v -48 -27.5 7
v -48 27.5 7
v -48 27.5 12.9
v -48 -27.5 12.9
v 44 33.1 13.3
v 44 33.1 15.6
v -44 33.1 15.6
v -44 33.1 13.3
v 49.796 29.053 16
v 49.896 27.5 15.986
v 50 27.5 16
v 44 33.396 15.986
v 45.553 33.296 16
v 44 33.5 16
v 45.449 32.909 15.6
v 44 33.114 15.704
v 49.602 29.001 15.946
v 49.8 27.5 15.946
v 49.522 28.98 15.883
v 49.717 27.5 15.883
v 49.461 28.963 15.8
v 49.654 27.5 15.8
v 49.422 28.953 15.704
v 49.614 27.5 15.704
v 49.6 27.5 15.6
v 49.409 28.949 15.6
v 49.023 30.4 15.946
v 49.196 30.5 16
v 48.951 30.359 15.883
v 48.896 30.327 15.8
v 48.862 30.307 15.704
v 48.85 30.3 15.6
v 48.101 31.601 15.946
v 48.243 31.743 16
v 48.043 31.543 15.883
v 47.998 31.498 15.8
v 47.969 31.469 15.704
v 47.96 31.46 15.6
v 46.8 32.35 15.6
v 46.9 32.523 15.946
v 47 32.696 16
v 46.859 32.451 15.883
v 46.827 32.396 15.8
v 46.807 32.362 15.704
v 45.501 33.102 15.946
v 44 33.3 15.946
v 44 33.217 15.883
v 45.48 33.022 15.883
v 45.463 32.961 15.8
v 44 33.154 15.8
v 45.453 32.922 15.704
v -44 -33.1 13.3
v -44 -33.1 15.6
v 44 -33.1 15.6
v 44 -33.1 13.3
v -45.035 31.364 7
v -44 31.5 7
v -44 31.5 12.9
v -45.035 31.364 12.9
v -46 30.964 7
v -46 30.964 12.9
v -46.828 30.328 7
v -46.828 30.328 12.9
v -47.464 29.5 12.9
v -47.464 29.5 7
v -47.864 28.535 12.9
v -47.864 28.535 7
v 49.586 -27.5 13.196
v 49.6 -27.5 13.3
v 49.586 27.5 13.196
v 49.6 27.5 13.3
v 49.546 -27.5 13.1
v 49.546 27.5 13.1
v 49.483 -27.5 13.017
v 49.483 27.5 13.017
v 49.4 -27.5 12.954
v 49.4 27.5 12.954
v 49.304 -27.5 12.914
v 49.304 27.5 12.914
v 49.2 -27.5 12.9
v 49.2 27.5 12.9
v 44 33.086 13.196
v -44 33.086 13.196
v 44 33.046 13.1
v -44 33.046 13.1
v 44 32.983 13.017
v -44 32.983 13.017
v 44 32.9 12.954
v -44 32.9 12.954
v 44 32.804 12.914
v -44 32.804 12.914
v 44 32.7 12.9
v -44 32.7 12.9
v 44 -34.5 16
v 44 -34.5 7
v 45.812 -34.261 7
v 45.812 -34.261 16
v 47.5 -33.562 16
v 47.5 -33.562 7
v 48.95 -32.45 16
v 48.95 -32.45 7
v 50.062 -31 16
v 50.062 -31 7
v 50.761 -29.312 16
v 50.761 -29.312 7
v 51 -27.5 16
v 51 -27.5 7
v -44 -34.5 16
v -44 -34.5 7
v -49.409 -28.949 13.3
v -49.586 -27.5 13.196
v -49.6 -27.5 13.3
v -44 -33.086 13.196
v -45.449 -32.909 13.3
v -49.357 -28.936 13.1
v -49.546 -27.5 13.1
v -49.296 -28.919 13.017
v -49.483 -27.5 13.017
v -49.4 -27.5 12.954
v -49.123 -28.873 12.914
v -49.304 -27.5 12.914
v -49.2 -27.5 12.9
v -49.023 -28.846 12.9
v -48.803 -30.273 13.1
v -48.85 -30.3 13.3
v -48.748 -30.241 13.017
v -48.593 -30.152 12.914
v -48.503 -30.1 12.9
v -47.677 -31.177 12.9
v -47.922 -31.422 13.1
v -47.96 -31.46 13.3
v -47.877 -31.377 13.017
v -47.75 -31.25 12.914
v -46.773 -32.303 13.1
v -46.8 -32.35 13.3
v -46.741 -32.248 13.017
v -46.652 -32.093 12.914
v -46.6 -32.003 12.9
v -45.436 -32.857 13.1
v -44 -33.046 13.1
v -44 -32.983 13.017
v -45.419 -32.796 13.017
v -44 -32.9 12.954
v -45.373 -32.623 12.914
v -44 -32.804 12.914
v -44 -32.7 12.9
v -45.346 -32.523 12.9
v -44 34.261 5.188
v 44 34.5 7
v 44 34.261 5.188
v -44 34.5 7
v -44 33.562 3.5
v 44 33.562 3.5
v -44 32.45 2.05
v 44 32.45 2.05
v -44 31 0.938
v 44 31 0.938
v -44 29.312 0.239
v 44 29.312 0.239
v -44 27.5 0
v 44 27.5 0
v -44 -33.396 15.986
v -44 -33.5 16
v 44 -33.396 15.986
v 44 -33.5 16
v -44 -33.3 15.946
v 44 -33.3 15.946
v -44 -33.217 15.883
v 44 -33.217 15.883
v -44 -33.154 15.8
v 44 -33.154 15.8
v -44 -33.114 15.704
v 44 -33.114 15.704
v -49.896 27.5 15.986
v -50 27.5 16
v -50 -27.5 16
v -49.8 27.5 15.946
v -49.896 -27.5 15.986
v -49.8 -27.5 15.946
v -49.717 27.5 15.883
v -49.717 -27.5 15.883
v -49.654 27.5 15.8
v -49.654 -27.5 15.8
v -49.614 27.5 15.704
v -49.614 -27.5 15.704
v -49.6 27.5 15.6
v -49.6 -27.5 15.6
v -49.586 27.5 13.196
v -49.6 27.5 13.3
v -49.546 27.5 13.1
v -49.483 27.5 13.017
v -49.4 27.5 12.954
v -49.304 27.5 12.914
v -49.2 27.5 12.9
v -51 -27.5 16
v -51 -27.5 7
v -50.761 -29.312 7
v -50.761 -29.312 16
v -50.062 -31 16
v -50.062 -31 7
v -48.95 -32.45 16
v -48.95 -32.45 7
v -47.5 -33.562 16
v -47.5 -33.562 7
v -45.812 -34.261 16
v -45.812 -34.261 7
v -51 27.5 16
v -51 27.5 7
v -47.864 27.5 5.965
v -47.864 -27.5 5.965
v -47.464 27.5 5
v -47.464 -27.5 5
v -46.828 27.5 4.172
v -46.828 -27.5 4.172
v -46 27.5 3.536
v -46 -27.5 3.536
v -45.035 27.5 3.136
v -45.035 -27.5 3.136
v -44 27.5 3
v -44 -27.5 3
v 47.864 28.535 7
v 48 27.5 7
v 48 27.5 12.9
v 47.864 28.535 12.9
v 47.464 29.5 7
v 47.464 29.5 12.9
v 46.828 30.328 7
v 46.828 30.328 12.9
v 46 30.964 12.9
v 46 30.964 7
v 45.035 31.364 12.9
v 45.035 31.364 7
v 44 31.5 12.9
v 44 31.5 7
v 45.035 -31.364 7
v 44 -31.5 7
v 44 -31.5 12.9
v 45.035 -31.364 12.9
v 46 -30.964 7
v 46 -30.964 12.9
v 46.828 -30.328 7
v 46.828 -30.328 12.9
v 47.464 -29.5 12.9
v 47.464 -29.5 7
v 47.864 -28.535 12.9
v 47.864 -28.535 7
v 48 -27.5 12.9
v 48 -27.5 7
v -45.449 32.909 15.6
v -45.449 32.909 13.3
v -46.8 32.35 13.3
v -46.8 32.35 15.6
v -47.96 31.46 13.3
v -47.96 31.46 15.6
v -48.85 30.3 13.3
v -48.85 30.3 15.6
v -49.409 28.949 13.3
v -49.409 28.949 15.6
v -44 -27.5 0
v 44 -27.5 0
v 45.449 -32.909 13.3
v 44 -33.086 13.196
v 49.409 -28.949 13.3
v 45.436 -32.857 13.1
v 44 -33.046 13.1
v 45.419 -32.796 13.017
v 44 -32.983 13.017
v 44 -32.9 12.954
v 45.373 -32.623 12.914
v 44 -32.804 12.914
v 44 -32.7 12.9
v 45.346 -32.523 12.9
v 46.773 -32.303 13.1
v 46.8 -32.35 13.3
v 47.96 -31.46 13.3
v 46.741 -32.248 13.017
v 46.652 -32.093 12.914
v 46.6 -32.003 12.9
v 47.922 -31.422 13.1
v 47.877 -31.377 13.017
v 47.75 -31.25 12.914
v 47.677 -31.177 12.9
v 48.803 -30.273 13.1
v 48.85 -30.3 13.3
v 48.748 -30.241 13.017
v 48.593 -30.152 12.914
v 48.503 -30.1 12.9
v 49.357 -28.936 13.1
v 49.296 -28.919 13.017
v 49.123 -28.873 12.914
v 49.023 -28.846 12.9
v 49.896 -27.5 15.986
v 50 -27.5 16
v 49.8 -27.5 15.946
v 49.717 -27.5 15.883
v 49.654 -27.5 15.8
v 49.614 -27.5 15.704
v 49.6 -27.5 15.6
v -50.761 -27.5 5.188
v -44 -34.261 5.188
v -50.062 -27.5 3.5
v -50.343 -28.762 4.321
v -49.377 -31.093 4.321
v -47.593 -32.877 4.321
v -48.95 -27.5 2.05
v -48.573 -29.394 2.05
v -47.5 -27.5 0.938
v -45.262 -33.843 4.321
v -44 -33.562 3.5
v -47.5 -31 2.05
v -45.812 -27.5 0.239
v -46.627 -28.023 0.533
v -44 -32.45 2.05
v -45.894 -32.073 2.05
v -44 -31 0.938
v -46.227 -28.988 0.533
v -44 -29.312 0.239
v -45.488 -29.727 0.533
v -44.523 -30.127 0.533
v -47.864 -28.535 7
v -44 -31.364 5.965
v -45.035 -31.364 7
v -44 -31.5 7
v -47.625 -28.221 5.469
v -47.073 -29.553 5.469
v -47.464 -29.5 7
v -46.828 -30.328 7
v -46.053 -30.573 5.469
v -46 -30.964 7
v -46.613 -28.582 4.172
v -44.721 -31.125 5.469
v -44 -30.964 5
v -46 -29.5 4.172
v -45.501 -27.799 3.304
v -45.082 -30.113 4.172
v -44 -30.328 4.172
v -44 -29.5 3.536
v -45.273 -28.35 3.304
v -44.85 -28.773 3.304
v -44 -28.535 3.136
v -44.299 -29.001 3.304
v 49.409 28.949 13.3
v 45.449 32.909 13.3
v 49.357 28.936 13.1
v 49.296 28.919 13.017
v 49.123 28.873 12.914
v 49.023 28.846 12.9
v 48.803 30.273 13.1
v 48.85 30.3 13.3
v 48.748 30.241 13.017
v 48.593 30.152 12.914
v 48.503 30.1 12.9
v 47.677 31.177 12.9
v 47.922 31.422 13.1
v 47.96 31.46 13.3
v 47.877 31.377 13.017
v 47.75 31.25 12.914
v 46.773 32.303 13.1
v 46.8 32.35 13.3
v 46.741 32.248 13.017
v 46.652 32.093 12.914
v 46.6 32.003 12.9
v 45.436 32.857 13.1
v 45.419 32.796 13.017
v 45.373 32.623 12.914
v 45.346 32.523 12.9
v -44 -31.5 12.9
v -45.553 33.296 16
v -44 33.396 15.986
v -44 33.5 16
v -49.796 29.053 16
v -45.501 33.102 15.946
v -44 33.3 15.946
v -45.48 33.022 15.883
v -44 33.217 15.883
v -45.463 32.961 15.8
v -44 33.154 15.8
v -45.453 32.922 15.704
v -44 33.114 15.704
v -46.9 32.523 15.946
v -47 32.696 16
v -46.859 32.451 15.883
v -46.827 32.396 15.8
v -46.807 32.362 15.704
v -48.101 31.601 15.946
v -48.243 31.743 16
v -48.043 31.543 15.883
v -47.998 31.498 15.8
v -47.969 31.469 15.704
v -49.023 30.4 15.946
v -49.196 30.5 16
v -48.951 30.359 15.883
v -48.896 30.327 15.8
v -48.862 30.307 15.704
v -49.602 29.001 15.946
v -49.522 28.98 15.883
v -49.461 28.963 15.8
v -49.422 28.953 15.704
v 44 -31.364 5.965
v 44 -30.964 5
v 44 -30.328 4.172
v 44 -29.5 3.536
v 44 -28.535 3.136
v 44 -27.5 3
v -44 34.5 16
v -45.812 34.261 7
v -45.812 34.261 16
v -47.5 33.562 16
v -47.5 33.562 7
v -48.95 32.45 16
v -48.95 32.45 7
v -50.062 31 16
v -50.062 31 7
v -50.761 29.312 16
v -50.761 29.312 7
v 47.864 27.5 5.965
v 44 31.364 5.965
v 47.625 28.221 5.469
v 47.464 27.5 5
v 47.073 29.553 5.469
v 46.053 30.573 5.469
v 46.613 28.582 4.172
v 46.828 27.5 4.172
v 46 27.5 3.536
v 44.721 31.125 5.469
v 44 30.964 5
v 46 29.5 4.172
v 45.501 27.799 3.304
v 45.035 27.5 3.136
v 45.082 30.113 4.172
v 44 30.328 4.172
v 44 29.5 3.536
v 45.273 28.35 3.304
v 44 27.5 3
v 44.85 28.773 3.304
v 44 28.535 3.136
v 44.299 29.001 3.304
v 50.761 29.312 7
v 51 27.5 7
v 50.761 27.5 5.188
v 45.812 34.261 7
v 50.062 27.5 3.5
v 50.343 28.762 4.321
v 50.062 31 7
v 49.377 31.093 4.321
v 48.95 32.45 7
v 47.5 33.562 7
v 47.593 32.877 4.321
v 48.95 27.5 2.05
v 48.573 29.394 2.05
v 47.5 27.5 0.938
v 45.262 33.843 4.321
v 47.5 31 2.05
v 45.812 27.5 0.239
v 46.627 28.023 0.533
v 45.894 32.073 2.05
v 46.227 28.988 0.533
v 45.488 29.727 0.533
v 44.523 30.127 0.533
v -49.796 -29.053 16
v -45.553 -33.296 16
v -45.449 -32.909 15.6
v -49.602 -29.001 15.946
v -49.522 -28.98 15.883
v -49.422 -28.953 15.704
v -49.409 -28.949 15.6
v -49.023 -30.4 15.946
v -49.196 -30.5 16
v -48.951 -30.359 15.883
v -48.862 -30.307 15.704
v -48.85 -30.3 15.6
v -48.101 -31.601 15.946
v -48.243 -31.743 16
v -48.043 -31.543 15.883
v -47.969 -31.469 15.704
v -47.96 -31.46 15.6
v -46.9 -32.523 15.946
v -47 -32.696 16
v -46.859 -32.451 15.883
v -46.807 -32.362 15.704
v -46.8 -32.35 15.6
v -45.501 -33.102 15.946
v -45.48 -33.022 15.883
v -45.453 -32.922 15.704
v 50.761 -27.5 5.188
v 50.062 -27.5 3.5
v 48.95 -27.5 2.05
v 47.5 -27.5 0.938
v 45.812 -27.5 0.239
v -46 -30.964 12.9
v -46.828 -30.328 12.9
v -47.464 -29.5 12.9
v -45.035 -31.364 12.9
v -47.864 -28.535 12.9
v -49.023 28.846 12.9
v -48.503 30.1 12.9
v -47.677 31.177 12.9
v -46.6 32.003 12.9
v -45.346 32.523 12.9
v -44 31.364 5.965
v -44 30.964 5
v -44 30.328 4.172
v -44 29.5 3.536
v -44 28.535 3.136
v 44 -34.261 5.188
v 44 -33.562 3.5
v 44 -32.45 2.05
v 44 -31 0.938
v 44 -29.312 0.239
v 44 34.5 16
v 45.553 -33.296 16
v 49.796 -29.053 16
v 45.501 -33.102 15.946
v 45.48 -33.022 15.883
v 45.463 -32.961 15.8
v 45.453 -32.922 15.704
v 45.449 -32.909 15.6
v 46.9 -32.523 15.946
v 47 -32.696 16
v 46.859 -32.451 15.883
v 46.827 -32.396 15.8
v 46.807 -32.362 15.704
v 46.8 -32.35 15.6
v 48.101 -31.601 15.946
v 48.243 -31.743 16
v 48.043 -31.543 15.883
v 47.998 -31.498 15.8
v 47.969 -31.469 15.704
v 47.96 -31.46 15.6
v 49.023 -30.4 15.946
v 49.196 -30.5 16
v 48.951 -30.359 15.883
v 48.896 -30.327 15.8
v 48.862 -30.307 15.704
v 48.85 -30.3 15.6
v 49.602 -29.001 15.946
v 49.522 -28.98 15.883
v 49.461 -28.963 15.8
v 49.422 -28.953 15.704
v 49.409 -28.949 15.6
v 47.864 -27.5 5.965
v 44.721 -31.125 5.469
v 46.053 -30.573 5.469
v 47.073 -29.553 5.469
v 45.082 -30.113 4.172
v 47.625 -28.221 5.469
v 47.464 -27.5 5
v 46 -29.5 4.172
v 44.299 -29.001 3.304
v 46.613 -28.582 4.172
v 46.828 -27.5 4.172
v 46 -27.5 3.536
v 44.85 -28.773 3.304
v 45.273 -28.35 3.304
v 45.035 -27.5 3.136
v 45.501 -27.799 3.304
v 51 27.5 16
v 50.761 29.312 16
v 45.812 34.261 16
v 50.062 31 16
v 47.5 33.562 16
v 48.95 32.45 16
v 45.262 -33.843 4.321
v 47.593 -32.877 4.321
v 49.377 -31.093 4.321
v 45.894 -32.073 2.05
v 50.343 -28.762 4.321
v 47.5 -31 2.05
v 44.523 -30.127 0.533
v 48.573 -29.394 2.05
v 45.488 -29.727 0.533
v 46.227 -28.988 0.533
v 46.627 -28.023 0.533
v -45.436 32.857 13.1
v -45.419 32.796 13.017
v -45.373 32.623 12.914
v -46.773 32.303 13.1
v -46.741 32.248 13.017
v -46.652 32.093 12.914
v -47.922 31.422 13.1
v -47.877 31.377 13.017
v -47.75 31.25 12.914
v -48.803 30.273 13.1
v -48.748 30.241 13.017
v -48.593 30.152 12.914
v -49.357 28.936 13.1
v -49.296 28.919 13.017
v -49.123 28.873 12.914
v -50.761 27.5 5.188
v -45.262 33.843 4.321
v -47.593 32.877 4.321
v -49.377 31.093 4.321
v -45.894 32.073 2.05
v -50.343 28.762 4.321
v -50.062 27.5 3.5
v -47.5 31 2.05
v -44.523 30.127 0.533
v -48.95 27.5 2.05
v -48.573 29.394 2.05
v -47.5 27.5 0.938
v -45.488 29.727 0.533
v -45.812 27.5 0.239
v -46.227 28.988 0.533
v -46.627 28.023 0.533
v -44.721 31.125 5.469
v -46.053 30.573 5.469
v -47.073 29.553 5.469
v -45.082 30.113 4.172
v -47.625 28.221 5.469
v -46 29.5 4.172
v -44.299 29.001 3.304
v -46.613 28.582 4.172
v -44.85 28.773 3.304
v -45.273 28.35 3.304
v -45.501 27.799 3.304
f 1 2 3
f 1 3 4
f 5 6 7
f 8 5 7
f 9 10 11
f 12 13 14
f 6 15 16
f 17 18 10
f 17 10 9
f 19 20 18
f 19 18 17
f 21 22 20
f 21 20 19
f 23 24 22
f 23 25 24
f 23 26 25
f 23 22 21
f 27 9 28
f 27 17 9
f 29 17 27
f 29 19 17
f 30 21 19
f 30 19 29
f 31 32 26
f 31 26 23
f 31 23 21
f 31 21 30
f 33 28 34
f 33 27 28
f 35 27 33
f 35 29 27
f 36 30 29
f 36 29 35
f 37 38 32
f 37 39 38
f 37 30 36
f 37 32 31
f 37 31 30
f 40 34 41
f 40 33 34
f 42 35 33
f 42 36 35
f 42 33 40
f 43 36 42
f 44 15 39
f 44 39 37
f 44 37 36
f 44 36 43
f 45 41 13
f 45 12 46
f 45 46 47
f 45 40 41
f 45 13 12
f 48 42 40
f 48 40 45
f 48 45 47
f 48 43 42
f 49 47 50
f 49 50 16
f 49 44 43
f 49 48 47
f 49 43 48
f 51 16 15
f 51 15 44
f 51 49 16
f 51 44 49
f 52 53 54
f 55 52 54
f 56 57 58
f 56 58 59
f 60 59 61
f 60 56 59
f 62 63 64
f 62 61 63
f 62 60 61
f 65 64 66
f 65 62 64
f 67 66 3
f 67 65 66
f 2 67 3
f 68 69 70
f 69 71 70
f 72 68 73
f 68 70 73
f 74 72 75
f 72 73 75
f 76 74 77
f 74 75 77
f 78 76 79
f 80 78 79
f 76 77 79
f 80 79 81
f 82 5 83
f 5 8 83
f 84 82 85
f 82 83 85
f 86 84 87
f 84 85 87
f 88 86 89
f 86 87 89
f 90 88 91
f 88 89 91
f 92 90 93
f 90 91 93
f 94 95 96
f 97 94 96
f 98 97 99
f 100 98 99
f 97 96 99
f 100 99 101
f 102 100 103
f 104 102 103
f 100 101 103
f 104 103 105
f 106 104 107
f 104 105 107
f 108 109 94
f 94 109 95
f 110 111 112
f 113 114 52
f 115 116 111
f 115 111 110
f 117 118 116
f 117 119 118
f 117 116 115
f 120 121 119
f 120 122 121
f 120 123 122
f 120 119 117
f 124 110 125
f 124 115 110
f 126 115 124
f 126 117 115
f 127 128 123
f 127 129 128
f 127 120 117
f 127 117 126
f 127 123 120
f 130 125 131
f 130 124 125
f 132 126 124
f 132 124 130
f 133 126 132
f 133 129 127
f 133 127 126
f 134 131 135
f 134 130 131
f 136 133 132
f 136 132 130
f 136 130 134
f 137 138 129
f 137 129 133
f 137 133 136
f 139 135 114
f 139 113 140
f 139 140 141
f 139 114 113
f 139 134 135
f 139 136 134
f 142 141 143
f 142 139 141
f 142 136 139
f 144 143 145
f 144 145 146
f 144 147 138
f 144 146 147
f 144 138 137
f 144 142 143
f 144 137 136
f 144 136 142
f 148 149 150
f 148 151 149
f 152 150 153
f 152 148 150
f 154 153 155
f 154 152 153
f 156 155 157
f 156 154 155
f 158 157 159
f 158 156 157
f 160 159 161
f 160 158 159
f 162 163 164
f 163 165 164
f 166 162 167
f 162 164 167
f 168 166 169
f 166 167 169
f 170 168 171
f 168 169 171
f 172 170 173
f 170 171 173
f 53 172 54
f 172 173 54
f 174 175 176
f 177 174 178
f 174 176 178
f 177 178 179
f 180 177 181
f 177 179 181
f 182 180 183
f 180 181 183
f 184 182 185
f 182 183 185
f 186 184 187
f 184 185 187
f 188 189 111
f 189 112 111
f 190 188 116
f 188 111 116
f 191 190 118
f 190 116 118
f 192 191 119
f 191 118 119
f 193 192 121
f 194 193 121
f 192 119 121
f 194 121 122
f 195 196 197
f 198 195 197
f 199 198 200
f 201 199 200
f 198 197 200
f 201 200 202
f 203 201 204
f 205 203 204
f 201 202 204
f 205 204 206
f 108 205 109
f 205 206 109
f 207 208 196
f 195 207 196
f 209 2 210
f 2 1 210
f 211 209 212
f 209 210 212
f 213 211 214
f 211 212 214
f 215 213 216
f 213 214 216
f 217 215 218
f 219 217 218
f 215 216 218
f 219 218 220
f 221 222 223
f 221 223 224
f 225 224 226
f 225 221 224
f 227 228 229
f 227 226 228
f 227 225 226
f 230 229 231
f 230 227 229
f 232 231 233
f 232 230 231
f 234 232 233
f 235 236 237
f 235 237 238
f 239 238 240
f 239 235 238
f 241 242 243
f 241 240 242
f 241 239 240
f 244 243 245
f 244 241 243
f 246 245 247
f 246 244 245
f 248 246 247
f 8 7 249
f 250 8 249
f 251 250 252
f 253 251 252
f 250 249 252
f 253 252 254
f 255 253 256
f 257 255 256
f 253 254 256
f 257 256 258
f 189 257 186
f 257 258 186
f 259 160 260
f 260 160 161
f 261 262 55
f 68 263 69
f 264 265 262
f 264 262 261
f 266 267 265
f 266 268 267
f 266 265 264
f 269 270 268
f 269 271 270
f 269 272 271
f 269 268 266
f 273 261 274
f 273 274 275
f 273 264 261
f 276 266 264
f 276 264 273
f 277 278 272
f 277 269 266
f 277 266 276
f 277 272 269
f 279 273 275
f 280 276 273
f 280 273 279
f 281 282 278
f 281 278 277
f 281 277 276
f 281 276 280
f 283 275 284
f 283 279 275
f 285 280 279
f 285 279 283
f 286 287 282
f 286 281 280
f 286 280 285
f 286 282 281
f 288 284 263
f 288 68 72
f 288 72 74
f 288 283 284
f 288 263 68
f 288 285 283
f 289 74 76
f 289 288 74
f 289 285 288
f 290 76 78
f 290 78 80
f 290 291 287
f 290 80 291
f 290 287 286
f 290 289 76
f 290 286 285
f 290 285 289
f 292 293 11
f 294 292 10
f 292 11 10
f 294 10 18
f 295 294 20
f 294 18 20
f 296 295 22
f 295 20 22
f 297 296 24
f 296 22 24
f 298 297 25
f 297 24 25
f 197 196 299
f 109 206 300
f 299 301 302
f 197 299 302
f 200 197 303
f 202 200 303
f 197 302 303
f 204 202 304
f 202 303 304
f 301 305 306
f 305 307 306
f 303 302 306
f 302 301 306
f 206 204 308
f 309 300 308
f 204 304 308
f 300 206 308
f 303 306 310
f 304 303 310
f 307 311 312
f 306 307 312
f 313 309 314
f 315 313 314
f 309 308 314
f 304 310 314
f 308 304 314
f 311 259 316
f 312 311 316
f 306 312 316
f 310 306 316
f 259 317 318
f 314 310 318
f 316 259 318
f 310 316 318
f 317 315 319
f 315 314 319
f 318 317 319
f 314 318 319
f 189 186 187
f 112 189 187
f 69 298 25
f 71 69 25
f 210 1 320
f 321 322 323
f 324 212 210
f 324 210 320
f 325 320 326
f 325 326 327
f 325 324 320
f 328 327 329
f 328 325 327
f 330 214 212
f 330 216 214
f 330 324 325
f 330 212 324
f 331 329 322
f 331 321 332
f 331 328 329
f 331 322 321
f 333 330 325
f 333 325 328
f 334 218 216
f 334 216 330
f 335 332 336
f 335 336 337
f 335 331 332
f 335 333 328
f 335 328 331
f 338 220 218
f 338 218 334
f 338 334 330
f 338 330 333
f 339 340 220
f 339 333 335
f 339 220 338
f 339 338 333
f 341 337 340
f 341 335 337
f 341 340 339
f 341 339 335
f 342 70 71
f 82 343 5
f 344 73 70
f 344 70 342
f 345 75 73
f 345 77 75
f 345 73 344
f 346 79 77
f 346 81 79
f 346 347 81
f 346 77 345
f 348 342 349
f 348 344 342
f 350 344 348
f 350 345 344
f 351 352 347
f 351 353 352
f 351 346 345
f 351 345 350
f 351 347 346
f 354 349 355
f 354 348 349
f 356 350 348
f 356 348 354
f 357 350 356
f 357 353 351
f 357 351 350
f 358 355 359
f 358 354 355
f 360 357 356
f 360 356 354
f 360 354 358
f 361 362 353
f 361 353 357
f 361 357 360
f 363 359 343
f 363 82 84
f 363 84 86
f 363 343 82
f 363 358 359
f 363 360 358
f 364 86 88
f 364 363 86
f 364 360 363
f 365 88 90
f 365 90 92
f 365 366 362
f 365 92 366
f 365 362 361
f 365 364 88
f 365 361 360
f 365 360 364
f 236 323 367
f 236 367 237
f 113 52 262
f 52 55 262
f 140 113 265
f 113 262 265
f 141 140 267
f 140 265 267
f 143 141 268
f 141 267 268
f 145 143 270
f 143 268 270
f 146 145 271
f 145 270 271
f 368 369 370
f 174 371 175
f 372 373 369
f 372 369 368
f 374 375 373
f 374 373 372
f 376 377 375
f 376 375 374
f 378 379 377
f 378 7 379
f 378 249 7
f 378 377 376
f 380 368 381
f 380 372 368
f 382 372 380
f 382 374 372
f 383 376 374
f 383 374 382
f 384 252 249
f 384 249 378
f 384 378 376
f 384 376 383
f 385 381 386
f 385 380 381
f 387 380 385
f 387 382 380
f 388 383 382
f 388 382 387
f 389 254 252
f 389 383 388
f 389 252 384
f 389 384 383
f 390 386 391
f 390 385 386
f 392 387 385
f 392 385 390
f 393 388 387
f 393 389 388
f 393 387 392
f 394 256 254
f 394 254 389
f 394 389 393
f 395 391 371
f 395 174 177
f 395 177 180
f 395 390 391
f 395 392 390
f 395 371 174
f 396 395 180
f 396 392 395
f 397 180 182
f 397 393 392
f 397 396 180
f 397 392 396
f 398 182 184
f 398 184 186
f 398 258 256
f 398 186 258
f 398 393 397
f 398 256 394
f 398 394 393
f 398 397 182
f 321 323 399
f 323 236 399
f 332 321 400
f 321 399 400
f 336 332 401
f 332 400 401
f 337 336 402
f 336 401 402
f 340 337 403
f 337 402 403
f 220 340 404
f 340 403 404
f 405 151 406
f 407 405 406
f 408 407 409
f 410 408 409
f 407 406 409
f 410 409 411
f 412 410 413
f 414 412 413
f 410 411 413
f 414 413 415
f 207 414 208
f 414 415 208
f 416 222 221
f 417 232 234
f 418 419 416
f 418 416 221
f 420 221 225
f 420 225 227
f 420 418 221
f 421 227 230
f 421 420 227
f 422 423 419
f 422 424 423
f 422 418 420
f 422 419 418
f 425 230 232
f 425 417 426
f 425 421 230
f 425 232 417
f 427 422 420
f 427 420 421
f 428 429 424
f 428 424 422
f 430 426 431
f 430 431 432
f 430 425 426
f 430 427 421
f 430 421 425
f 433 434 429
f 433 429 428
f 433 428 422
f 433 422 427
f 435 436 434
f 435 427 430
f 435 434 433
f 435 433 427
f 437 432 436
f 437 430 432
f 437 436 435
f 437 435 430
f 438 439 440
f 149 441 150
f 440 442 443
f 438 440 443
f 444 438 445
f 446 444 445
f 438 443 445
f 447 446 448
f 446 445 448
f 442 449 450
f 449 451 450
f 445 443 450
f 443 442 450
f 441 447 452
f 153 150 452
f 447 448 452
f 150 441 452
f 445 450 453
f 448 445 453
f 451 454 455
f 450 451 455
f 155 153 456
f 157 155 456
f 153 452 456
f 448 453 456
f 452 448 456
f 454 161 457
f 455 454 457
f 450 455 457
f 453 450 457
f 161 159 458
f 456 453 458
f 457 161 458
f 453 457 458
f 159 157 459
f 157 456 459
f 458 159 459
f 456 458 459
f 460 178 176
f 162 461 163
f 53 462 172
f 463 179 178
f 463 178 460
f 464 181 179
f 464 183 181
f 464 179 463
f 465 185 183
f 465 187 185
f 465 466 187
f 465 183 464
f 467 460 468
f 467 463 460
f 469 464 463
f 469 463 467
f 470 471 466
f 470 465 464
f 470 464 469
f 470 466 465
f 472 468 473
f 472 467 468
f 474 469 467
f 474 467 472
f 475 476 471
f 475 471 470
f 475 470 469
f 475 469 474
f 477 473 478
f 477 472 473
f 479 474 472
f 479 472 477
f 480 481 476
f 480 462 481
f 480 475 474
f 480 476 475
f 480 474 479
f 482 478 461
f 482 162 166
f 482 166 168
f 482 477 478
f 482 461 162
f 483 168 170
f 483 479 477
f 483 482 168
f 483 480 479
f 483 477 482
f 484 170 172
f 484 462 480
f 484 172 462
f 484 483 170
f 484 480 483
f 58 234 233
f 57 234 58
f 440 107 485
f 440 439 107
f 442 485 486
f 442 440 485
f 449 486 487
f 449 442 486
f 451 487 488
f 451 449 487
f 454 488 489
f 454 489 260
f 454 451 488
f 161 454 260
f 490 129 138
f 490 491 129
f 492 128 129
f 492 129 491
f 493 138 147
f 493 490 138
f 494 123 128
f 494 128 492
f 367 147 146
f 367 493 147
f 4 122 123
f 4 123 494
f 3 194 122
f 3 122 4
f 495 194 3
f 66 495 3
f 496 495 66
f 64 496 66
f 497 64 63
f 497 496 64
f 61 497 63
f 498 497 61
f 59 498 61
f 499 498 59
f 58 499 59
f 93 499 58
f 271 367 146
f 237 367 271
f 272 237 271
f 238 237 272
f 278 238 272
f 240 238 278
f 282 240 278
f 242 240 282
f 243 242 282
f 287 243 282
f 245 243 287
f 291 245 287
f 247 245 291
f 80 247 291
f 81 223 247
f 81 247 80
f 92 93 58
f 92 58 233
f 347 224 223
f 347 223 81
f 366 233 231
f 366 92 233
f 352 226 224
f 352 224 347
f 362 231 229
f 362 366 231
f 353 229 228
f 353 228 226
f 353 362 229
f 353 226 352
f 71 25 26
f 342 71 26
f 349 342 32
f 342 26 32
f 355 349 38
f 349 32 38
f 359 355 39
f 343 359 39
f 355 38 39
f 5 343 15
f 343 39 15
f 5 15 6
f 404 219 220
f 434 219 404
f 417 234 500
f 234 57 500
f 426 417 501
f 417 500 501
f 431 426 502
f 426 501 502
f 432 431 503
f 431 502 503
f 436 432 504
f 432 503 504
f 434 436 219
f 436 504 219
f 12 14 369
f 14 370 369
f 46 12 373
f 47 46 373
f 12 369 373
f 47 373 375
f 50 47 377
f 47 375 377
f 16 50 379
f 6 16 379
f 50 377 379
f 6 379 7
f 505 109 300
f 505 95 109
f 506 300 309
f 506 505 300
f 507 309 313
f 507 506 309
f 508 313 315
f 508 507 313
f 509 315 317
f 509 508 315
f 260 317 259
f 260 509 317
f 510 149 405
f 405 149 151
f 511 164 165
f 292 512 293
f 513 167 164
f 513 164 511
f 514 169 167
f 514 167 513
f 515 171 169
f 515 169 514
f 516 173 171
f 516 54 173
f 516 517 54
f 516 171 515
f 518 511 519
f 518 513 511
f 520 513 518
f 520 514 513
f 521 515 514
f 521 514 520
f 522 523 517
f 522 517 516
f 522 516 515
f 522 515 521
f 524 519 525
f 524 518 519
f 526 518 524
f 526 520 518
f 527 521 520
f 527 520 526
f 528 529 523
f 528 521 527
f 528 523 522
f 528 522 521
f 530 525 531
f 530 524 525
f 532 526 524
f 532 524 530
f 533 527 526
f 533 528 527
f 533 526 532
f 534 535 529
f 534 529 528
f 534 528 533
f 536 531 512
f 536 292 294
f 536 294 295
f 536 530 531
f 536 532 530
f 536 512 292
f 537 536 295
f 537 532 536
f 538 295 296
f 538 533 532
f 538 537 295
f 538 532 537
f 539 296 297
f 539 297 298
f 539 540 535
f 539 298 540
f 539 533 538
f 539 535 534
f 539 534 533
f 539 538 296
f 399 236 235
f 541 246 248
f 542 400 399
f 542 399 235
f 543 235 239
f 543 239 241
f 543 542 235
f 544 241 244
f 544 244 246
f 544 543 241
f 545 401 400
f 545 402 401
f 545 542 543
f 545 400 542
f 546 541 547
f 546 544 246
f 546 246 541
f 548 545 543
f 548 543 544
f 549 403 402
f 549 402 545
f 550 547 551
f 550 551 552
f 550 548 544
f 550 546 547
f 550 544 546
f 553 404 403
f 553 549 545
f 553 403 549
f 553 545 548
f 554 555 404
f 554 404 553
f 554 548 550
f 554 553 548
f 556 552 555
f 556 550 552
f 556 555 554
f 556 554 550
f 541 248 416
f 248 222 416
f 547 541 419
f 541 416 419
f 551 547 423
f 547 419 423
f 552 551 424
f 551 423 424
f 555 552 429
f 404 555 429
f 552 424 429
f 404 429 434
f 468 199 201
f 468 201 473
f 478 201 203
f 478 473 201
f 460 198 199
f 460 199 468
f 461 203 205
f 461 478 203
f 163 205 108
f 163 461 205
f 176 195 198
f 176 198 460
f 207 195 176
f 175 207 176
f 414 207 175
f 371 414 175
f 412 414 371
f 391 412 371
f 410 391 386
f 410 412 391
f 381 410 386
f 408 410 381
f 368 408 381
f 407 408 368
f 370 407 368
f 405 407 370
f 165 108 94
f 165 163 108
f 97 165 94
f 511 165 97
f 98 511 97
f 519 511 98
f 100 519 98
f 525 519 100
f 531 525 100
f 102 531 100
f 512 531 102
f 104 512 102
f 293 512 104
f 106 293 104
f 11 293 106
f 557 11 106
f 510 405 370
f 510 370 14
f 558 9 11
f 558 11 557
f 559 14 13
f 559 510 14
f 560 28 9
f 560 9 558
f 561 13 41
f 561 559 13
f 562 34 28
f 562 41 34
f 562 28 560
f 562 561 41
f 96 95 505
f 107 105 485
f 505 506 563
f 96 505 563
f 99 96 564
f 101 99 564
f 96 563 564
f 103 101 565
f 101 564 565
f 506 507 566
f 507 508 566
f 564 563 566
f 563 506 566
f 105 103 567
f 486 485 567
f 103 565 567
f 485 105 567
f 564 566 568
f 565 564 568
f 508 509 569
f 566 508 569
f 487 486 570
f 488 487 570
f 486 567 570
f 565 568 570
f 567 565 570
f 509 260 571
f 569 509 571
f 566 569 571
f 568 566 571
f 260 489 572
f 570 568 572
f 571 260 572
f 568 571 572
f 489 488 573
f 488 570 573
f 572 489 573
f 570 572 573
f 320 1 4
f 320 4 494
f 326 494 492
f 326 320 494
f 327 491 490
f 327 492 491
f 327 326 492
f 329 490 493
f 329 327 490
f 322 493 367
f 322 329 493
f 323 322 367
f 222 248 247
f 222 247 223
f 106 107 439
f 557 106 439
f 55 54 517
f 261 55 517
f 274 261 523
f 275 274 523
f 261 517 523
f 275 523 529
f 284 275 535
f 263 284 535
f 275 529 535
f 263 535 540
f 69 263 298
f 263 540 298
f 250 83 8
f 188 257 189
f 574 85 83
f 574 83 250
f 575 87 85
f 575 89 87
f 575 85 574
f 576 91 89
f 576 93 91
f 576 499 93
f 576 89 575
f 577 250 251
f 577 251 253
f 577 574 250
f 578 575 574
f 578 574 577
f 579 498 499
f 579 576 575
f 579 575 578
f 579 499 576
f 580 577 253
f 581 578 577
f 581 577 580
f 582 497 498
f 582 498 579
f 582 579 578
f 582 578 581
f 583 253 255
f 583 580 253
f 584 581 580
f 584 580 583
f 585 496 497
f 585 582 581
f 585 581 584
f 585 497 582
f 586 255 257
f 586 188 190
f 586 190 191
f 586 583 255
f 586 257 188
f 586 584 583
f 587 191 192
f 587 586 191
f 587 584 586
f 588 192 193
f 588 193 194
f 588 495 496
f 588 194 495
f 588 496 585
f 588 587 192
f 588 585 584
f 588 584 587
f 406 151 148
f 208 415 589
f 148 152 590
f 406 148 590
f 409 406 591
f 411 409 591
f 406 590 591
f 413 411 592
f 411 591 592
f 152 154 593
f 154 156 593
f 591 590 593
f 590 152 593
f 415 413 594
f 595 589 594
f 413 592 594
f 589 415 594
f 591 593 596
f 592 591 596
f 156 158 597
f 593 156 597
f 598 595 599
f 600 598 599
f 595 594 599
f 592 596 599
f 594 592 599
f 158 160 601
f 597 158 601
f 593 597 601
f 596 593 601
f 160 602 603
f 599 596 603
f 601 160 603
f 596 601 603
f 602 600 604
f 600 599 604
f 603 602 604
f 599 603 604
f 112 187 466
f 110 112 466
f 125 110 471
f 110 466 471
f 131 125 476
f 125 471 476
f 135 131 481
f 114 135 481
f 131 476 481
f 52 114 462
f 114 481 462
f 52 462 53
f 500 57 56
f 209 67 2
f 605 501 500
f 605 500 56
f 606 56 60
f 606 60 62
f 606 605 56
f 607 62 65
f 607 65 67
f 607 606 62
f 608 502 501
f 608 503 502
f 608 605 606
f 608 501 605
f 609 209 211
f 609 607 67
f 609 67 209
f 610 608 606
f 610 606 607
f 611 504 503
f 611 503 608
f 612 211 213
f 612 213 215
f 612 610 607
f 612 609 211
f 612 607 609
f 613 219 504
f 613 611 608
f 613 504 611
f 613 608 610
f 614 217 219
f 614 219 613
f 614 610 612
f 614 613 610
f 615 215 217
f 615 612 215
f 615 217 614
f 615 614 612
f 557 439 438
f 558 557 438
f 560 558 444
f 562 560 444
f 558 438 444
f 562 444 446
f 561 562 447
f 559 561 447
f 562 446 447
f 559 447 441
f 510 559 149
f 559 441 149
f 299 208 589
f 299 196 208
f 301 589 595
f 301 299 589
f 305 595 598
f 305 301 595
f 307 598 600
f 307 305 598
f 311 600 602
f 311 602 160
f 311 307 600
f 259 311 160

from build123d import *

# Parameters (mm, degrees)
F1_DEPTH = 16
F2_R     = 7
F3_T     = -3
F5_DEPTH = 3.1
F6_R     = 0.4


with BuildPart() as f1:
    # F0 (on Top) → F1 (new body)
    with BuildSketch(Plane.XY):
        with BuildLine():
            Line((-44, -34.5), (44, -34.5))
            ThreePointArc((44, -34.5), (48.9497474683, -32.4497474683), (51, -27.5))
            Line((51, -27.5), (51, 27.5))
            ThreePointArc((51, 27.5), (48.9497474683, 32.4497474683), (44, 34.5))
            Line((44, 34.5), (-44, 34.5))
            ThreePointArc((-44, 34.5), (-48.9497474683, 32.4497474683), (-51, 27.5))
            Line((-51, 27.5), (-51, -27.5))
            ThreePointArc((-51, -27.5), (-48.9497474683, -32.4497474683), (-44, -34.5))
        make_face()
    extrude(amount=F1_DEPTH)

    # F2
    f2_edges = [f1.edges().sort_by_distance(p)[0] for p in [
        (0, -34.5, 0),
    ]]
    fillet(f2_edges, radius=F2_R)

    # F3
    f3_openings = [f1.faces().sort_by_distance(p)[0] for p in [
        (0, 0, 16),
    ]]
    offset(amount=F3_T, openings=f3_openings)

    # F4 (on face) → F5 (cut)
    with BuildSketch(Plane.XY.offset(16)):
        with BuildLine():
            Line((49.6, -27.5), (49.6, 27.5))
            ThreePointArc((49.6, 27.5), (47.9597979746, 31.4597979746), (44, 33.1))
            Line((44, 33.1), (-44, 33.1))
            ThreePointArc((-44, 33.1), (-47.9597979746, 31.4597979746), (-49.6, 27.5))
            Line((-49.6, 27.5), (-49.6, -27.5))
            ThreePointArc((-49.6, -27.5), (-47.9597979746, -31.4597979746), (-44, -33.1))
            Line((-44, -33.1), (44, -33.1))
            ThreePointArc((44, -33.1), (47.9597979746, -31.4597979746), (49.6, -27.5))
        make_face()
        with BuildLine():
            Line((-44, 31.5), (44, 31.5))
            ThreePointArc((44, 31.5), (46.8284271247, 30.3284271247), (48, 27.5))
            Line((48, 27.5), (48, -27.5))
            ThreePointArc((48, -27.5), (46.8284271247, -30.3284271247), (44, -31.5))
            Line((44, -31.5), (-44, -31.5))
            ThreePointArc((-44, -31.5), (-46.8284271247, -30.3284271247), (-48, -27.5))
            Line((-48, -27.5), (-48, 27.5))
            ThreePointArc((-48, 27.5), (-46.8284271247, 30.3284271247), (-44, 31.5))
        make_face(mode=Mode.SUBTRACT)
    extrude(amount=-F5_DEPTH, mode=Mode.SUBTRACT)

    # F6
    f6_edges = [f1.edges().sort_by_distance(p)[0] for p in [
        (0, 33.1, 12.9),
        (0, -33.1, 16),
    ]]
    fillet(f6_edges, radius=F6_R)


solid = f1.part
